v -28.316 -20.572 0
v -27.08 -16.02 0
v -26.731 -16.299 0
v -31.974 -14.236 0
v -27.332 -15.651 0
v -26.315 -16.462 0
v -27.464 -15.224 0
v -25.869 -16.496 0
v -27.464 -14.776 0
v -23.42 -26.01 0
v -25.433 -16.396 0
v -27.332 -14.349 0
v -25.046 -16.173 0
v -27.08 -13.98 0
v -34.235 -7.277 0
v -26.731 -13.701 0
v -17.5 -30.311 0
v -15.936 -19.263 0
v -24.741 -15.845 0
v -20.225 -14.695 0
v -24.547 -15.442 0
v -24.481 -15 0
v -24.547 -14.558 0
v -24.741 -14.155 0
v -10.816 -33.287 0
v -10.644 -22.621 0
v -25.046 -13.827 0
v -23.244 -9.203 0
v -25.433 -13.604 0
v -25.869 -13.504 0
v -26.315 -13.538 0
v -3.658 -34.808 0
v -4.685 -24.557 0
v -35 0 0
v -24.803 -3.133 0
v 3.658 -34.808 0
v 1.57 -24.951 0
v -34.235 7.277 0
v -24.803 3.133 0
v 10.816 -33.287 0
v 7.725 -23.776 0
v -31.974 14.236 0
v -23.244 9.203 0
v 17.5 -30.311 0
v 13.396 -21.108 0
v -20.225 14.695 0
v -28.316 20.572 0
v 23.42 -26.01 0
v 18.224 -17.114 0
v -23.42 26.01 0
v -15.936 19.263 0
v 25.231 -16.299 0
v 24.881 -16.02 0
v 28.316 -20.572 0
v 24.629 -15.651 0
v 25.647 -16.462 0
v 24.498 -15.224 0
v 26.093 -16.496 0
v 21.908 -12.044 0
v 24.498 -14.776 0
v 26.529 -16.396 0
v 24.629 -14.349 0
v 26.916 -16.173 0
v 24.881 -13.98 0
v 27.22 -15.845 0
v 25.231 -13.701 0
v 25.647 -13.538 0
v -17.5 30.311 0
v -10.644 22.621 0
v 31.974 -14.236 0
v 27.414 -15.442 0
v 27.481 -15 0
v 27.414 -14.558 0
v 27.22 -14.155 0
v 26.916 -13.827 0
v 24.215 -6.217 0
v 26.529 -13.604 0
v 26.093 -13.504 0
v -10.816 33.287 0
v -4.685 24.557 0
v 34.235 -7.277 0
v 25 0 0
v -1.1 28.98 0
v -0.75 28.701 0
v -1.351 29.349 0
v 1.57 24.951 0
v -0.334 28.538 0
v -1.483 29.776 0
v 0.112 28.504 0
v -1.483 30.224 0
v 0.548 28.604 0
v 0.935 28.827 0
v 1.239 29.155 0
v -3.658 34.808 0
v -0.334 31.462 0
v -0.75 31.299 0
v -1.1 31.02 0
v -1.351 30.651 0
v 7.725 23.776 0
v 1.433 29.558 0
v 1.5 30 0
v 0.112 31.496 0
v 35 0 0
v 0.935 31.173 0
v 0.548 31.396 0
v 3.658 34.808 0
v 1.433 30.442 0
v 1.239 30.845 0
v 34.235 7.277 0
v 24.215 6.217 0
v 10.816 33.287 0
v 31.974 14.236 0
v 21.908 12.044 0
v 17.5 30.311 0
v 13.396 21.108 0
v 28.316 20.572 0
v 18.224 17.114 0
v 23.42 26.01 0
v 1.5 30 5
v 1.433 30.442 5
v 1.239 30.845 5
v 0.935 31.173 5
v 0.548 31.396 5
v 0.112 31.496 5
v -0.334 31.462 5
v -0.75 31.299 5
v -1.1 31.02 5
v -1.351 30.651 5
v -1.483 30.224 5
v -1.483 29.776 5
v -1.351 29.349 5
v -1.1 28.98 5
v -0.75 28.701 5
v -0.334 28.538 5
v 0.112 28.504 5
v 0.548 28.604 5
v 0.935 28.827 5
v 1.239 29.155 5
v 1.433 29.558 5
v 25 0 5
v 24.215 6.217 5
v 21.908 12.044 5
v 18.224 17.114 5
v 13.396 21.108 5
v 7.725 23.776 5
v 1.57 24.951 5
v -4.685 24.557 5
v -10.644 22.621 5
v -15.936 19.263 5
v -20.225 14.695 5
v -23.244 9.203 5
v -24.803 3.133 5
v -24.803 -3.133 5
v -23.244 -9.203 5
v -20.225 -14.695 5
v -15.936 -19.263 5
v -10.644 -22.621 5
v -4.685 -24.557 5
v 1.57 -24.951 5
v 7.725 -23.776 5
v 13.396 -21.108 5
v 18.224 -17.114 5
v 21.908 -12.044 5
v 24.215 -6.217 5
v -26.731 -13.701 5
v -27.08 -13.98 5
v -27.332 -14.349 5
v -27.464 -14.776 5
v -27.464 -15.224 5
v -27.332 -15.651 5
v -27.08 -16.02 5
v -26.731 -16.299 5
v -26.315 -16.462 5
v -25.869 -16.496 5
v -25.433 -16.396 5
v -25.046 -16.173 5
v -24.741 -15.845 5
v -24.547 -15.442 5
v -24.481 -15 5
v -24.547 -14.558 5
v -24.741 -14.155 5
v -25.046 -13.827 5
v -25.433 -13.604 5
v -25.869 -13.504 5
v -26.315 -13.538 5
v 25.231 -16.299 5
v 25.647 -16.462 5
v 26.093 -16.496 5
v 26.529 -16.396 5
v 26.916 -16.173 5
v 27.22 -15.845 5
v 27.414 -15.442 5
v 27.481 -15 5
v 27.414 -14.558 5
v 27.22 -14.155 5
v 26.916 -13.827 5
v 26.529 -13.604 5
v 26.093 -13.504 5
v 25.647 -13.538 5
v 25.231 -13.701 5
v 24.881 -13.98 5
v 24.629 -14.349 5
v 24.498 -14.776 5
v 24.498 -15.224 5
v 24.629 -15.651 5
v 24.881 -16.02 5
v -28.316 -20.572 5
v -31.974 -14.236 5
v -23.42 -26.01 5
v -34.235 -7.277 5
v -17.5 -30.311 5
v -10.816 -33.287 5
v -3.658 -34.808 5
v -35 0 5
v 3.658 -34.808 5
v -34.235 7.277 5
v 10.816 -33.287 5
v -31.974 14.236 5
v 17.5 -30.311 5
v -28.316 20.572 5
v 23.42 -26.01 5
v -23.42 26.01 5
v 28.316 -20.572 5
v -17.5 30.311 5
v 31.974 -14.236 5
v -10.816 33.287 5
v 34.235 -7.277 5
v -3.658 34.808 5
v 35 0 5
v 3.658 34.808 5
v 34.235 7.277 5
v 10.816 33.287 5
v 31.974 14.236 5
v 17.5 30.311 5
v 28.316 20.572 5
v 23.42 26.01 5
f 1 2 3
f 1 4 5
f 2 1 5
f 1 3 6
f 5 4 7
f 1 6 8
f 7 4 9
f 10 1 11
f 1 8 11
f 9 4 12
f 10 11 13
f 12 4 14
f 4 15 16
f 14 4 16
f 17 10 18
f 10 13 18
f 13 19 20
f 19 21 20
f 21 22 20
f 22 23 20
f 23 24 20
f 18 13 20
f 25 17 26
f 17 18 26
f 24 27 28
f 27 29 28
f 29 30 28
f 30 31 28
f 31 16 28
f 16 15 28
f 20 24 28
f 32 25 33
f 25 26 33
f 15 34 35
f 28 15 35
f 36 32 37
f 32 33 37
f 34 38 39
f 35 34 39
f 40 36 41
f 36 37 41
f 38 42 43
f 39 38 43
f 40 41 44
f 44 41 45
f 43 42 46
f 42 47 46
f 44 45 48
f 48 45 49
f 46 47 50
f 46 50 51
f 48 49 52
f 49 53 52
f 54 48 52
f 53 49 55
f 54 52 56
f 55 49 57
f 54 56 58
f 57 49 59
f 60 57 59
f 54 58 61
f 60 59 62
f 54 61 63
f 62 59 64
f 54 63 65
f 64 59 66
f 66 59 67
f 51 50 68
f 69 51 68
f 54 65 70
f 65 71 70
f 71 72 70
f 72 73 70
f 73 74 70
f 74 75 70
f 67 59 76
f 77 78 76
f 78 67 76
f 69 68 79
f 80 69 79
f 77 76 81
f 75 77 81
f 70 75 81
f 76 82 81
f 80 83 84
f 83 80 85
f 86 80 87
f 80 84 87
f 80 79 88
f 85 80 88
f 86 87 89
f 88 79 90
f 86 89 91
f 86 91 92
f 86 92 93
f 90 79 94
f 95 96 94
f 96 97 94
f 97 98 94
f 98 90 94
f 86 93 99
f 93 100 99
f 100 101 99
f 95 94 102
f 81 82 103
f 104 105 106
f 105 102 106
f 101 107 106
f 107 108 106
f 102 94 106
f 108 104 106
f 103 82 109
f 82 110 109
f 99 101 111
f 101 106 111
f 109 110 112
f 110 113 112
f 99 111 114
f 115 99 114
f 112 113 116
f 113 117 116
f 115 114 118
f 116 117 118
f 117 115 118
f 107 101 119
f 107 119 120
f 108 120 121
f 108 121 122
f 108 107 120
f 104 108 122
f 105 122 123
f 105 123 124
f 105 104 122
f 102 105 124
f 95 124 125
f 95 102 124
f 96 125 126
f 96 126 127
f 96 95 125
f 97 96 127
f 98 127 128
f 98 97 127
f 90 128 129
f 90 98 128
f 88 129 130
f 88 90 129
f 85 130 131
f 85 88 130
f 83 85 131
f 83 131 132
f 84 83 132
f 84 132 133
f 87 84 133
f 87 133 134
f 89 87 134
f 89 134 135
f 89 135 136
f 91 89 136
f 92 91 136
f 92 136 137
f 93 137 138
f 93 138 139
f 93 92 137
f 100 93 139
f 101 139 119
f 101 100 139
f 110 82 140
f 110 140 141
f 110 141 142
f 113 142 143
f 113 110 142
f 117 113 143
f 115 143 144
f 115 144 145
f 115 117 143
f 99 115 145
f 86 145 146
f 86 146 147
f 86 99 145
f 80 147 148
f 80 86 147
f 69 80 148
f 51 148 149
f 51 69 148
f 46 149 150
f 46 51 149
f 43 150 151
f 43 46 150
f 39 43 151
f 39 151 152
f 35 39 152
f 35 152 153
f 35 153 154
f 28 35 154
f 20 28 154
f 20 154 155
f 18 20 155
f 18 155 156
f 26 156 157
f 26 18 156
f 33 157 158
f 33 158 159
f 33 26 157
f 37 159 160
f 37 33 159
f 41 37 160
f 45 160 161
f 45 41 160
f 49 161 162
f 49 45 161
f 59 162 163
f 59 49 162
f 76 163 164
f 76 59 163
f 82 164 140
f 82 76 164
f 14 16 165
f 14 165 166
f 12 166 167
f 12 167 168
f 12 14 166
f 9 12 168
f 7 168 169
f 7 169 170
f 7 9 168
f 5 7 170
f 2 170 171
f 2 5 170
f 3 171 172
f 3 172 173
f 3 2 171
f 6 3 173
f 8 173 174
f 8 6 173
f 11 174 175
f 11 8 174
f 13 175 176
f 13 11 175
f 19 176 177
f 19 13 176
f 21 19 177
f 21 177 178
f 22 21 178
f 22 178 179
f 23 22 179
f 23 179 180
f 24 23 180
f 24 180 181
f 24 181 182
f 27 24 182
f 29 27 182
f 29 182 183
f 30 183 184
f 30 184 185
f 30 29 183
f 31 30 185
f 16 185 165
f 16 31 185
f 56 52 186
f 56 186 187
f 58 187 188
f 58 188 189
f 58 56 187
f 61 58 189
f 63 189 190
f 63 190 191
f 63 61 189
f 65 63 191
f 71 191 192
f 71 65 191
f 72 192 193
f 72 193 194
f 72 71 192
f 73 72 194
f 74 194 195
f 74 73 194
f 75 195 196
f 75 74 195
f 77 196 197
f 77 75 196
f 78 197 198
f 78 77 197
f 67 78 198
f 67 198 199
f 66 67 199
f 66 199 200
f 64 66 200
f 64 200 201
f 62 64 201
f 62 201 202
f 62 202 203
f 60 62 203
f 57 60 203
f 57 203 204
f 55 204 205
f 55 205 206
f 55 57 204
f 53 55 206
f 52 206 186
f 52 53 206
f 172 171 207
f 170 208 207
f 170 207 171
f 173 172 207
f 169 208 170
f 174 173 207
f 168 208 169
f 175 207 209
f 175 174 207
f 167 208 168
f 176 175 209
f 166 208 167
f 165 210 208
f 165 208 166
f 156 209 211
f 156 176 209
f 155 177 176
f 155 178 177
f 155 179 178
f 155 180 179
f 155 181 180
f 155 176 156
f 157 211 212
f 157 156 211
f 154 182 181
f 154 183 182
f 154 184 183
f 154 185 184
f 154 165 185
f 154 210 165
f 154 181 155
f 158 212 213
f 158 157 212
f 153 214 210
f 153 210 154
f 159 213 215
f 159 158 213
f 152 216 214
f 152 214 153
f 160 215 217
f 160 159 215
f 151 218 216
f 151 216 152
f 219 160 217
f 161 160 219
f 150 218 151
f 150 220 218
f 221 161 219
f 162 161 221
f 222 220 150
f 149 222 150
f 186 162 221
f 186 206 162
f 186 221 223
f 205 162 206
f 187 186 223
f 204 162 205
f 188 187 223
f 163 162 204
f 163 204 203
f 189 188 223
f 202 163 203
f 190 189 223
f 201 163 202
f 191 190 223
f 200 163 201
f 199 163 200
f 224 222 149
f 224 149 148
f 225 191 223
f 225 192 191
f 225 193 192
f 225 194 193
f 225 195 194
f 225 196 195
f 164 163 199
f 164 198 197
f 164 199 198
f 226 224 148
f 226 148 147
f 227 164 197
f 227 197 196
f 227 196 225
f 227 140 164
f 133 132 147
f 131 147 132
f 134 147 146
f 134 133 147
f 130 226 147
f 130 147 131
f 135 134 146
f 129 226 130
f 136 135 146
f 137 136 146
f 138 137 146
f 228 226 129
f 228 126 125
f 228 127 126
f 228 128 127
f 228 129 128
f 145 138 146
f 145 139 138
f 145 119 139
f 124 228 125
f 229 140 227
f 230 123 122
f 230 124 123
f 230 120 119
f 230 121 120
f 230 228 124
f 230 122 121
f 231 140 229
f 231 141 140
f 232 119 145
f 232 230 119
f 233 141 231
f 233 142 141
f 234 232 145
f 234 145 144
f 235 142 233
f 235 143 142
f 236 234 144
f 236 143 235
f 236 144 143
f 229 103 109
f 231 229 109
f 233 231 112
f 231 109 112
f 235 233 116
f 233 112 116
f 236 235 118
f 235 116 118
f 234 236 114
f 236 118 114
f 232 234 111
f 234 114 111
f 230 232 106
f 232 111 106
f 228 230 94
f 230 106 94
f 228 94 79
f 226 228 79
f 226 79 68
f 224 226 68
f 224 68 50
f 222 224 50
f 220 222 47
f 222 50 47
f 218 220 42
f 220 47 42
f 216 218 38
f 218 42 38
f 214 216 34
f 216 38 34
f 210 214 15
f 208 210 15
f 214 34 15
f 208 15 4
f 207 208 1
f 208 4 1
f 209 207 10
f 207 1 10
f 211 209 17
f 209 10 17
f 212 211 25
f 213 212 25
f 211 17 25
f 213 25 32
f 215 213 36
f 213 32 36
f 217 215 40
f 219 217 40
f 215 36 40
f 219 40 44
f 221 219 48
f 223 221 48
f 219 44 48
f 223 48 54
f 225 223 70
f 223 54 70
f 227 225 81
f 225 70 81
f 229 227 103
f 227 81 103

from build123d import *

# Parameters (mm, degrees)
CYLINDER004_R     = 25
CYLINDER004_DEPTH = 5
CYLINDER003_R     = 1.5
CYLINDER003_DEPTH = 5
ARRAY_COUNT       = 3
CYLINDER002_R     = 35
CYLINDER002_DEPTH = 5


with BuildPart() as cylinderboring:
    # Cylinder004 → Cylinder004 (new body)
    with BuildSketch(Plane.XY):
        Circle(CYLINDER004_R)
    extrude(amount=CYLINDER004_DEPTH)


with BuildPart() as fusion145:
    # Cylinder003 → Cylinder003 (new body)
    with BuildSketch(Plane(origin=(0, 30, 0), x_dir=(1, 0, 0), z_dir=(0, 0, 1))):
        Circle(CYLINDER003_R)
    extrude(amount=CYLINDER003_DEPTH)

    # Array: Fusion145 ×3 about axis
    array_axis = Axis((0, 0, 0), (0, 0, 1))


with BuildPart() as fusion145_1:
    add(fusion145.part)
    for i in range(1, ARRAY_COUNT):
        add(fusion145.part.rotate(array_axis, i * 360 / ARRAY_COUNT))

    # Fusion145: union CylinderBoring
    add(cylinderboring.part)


with BuildPart() as cut:
    # Cylinder002 → Cylinder002 (new body)
    with BuildSketch(Plane.XY):
        Circle(CYLINDER002_R)
    extrude(amount=CYLINDER002_DEPTH)

    # Cut: cut Fusion145
    add(fusion145_1.part, mode=Mode.SUBTRACT)


solid = cut.part
